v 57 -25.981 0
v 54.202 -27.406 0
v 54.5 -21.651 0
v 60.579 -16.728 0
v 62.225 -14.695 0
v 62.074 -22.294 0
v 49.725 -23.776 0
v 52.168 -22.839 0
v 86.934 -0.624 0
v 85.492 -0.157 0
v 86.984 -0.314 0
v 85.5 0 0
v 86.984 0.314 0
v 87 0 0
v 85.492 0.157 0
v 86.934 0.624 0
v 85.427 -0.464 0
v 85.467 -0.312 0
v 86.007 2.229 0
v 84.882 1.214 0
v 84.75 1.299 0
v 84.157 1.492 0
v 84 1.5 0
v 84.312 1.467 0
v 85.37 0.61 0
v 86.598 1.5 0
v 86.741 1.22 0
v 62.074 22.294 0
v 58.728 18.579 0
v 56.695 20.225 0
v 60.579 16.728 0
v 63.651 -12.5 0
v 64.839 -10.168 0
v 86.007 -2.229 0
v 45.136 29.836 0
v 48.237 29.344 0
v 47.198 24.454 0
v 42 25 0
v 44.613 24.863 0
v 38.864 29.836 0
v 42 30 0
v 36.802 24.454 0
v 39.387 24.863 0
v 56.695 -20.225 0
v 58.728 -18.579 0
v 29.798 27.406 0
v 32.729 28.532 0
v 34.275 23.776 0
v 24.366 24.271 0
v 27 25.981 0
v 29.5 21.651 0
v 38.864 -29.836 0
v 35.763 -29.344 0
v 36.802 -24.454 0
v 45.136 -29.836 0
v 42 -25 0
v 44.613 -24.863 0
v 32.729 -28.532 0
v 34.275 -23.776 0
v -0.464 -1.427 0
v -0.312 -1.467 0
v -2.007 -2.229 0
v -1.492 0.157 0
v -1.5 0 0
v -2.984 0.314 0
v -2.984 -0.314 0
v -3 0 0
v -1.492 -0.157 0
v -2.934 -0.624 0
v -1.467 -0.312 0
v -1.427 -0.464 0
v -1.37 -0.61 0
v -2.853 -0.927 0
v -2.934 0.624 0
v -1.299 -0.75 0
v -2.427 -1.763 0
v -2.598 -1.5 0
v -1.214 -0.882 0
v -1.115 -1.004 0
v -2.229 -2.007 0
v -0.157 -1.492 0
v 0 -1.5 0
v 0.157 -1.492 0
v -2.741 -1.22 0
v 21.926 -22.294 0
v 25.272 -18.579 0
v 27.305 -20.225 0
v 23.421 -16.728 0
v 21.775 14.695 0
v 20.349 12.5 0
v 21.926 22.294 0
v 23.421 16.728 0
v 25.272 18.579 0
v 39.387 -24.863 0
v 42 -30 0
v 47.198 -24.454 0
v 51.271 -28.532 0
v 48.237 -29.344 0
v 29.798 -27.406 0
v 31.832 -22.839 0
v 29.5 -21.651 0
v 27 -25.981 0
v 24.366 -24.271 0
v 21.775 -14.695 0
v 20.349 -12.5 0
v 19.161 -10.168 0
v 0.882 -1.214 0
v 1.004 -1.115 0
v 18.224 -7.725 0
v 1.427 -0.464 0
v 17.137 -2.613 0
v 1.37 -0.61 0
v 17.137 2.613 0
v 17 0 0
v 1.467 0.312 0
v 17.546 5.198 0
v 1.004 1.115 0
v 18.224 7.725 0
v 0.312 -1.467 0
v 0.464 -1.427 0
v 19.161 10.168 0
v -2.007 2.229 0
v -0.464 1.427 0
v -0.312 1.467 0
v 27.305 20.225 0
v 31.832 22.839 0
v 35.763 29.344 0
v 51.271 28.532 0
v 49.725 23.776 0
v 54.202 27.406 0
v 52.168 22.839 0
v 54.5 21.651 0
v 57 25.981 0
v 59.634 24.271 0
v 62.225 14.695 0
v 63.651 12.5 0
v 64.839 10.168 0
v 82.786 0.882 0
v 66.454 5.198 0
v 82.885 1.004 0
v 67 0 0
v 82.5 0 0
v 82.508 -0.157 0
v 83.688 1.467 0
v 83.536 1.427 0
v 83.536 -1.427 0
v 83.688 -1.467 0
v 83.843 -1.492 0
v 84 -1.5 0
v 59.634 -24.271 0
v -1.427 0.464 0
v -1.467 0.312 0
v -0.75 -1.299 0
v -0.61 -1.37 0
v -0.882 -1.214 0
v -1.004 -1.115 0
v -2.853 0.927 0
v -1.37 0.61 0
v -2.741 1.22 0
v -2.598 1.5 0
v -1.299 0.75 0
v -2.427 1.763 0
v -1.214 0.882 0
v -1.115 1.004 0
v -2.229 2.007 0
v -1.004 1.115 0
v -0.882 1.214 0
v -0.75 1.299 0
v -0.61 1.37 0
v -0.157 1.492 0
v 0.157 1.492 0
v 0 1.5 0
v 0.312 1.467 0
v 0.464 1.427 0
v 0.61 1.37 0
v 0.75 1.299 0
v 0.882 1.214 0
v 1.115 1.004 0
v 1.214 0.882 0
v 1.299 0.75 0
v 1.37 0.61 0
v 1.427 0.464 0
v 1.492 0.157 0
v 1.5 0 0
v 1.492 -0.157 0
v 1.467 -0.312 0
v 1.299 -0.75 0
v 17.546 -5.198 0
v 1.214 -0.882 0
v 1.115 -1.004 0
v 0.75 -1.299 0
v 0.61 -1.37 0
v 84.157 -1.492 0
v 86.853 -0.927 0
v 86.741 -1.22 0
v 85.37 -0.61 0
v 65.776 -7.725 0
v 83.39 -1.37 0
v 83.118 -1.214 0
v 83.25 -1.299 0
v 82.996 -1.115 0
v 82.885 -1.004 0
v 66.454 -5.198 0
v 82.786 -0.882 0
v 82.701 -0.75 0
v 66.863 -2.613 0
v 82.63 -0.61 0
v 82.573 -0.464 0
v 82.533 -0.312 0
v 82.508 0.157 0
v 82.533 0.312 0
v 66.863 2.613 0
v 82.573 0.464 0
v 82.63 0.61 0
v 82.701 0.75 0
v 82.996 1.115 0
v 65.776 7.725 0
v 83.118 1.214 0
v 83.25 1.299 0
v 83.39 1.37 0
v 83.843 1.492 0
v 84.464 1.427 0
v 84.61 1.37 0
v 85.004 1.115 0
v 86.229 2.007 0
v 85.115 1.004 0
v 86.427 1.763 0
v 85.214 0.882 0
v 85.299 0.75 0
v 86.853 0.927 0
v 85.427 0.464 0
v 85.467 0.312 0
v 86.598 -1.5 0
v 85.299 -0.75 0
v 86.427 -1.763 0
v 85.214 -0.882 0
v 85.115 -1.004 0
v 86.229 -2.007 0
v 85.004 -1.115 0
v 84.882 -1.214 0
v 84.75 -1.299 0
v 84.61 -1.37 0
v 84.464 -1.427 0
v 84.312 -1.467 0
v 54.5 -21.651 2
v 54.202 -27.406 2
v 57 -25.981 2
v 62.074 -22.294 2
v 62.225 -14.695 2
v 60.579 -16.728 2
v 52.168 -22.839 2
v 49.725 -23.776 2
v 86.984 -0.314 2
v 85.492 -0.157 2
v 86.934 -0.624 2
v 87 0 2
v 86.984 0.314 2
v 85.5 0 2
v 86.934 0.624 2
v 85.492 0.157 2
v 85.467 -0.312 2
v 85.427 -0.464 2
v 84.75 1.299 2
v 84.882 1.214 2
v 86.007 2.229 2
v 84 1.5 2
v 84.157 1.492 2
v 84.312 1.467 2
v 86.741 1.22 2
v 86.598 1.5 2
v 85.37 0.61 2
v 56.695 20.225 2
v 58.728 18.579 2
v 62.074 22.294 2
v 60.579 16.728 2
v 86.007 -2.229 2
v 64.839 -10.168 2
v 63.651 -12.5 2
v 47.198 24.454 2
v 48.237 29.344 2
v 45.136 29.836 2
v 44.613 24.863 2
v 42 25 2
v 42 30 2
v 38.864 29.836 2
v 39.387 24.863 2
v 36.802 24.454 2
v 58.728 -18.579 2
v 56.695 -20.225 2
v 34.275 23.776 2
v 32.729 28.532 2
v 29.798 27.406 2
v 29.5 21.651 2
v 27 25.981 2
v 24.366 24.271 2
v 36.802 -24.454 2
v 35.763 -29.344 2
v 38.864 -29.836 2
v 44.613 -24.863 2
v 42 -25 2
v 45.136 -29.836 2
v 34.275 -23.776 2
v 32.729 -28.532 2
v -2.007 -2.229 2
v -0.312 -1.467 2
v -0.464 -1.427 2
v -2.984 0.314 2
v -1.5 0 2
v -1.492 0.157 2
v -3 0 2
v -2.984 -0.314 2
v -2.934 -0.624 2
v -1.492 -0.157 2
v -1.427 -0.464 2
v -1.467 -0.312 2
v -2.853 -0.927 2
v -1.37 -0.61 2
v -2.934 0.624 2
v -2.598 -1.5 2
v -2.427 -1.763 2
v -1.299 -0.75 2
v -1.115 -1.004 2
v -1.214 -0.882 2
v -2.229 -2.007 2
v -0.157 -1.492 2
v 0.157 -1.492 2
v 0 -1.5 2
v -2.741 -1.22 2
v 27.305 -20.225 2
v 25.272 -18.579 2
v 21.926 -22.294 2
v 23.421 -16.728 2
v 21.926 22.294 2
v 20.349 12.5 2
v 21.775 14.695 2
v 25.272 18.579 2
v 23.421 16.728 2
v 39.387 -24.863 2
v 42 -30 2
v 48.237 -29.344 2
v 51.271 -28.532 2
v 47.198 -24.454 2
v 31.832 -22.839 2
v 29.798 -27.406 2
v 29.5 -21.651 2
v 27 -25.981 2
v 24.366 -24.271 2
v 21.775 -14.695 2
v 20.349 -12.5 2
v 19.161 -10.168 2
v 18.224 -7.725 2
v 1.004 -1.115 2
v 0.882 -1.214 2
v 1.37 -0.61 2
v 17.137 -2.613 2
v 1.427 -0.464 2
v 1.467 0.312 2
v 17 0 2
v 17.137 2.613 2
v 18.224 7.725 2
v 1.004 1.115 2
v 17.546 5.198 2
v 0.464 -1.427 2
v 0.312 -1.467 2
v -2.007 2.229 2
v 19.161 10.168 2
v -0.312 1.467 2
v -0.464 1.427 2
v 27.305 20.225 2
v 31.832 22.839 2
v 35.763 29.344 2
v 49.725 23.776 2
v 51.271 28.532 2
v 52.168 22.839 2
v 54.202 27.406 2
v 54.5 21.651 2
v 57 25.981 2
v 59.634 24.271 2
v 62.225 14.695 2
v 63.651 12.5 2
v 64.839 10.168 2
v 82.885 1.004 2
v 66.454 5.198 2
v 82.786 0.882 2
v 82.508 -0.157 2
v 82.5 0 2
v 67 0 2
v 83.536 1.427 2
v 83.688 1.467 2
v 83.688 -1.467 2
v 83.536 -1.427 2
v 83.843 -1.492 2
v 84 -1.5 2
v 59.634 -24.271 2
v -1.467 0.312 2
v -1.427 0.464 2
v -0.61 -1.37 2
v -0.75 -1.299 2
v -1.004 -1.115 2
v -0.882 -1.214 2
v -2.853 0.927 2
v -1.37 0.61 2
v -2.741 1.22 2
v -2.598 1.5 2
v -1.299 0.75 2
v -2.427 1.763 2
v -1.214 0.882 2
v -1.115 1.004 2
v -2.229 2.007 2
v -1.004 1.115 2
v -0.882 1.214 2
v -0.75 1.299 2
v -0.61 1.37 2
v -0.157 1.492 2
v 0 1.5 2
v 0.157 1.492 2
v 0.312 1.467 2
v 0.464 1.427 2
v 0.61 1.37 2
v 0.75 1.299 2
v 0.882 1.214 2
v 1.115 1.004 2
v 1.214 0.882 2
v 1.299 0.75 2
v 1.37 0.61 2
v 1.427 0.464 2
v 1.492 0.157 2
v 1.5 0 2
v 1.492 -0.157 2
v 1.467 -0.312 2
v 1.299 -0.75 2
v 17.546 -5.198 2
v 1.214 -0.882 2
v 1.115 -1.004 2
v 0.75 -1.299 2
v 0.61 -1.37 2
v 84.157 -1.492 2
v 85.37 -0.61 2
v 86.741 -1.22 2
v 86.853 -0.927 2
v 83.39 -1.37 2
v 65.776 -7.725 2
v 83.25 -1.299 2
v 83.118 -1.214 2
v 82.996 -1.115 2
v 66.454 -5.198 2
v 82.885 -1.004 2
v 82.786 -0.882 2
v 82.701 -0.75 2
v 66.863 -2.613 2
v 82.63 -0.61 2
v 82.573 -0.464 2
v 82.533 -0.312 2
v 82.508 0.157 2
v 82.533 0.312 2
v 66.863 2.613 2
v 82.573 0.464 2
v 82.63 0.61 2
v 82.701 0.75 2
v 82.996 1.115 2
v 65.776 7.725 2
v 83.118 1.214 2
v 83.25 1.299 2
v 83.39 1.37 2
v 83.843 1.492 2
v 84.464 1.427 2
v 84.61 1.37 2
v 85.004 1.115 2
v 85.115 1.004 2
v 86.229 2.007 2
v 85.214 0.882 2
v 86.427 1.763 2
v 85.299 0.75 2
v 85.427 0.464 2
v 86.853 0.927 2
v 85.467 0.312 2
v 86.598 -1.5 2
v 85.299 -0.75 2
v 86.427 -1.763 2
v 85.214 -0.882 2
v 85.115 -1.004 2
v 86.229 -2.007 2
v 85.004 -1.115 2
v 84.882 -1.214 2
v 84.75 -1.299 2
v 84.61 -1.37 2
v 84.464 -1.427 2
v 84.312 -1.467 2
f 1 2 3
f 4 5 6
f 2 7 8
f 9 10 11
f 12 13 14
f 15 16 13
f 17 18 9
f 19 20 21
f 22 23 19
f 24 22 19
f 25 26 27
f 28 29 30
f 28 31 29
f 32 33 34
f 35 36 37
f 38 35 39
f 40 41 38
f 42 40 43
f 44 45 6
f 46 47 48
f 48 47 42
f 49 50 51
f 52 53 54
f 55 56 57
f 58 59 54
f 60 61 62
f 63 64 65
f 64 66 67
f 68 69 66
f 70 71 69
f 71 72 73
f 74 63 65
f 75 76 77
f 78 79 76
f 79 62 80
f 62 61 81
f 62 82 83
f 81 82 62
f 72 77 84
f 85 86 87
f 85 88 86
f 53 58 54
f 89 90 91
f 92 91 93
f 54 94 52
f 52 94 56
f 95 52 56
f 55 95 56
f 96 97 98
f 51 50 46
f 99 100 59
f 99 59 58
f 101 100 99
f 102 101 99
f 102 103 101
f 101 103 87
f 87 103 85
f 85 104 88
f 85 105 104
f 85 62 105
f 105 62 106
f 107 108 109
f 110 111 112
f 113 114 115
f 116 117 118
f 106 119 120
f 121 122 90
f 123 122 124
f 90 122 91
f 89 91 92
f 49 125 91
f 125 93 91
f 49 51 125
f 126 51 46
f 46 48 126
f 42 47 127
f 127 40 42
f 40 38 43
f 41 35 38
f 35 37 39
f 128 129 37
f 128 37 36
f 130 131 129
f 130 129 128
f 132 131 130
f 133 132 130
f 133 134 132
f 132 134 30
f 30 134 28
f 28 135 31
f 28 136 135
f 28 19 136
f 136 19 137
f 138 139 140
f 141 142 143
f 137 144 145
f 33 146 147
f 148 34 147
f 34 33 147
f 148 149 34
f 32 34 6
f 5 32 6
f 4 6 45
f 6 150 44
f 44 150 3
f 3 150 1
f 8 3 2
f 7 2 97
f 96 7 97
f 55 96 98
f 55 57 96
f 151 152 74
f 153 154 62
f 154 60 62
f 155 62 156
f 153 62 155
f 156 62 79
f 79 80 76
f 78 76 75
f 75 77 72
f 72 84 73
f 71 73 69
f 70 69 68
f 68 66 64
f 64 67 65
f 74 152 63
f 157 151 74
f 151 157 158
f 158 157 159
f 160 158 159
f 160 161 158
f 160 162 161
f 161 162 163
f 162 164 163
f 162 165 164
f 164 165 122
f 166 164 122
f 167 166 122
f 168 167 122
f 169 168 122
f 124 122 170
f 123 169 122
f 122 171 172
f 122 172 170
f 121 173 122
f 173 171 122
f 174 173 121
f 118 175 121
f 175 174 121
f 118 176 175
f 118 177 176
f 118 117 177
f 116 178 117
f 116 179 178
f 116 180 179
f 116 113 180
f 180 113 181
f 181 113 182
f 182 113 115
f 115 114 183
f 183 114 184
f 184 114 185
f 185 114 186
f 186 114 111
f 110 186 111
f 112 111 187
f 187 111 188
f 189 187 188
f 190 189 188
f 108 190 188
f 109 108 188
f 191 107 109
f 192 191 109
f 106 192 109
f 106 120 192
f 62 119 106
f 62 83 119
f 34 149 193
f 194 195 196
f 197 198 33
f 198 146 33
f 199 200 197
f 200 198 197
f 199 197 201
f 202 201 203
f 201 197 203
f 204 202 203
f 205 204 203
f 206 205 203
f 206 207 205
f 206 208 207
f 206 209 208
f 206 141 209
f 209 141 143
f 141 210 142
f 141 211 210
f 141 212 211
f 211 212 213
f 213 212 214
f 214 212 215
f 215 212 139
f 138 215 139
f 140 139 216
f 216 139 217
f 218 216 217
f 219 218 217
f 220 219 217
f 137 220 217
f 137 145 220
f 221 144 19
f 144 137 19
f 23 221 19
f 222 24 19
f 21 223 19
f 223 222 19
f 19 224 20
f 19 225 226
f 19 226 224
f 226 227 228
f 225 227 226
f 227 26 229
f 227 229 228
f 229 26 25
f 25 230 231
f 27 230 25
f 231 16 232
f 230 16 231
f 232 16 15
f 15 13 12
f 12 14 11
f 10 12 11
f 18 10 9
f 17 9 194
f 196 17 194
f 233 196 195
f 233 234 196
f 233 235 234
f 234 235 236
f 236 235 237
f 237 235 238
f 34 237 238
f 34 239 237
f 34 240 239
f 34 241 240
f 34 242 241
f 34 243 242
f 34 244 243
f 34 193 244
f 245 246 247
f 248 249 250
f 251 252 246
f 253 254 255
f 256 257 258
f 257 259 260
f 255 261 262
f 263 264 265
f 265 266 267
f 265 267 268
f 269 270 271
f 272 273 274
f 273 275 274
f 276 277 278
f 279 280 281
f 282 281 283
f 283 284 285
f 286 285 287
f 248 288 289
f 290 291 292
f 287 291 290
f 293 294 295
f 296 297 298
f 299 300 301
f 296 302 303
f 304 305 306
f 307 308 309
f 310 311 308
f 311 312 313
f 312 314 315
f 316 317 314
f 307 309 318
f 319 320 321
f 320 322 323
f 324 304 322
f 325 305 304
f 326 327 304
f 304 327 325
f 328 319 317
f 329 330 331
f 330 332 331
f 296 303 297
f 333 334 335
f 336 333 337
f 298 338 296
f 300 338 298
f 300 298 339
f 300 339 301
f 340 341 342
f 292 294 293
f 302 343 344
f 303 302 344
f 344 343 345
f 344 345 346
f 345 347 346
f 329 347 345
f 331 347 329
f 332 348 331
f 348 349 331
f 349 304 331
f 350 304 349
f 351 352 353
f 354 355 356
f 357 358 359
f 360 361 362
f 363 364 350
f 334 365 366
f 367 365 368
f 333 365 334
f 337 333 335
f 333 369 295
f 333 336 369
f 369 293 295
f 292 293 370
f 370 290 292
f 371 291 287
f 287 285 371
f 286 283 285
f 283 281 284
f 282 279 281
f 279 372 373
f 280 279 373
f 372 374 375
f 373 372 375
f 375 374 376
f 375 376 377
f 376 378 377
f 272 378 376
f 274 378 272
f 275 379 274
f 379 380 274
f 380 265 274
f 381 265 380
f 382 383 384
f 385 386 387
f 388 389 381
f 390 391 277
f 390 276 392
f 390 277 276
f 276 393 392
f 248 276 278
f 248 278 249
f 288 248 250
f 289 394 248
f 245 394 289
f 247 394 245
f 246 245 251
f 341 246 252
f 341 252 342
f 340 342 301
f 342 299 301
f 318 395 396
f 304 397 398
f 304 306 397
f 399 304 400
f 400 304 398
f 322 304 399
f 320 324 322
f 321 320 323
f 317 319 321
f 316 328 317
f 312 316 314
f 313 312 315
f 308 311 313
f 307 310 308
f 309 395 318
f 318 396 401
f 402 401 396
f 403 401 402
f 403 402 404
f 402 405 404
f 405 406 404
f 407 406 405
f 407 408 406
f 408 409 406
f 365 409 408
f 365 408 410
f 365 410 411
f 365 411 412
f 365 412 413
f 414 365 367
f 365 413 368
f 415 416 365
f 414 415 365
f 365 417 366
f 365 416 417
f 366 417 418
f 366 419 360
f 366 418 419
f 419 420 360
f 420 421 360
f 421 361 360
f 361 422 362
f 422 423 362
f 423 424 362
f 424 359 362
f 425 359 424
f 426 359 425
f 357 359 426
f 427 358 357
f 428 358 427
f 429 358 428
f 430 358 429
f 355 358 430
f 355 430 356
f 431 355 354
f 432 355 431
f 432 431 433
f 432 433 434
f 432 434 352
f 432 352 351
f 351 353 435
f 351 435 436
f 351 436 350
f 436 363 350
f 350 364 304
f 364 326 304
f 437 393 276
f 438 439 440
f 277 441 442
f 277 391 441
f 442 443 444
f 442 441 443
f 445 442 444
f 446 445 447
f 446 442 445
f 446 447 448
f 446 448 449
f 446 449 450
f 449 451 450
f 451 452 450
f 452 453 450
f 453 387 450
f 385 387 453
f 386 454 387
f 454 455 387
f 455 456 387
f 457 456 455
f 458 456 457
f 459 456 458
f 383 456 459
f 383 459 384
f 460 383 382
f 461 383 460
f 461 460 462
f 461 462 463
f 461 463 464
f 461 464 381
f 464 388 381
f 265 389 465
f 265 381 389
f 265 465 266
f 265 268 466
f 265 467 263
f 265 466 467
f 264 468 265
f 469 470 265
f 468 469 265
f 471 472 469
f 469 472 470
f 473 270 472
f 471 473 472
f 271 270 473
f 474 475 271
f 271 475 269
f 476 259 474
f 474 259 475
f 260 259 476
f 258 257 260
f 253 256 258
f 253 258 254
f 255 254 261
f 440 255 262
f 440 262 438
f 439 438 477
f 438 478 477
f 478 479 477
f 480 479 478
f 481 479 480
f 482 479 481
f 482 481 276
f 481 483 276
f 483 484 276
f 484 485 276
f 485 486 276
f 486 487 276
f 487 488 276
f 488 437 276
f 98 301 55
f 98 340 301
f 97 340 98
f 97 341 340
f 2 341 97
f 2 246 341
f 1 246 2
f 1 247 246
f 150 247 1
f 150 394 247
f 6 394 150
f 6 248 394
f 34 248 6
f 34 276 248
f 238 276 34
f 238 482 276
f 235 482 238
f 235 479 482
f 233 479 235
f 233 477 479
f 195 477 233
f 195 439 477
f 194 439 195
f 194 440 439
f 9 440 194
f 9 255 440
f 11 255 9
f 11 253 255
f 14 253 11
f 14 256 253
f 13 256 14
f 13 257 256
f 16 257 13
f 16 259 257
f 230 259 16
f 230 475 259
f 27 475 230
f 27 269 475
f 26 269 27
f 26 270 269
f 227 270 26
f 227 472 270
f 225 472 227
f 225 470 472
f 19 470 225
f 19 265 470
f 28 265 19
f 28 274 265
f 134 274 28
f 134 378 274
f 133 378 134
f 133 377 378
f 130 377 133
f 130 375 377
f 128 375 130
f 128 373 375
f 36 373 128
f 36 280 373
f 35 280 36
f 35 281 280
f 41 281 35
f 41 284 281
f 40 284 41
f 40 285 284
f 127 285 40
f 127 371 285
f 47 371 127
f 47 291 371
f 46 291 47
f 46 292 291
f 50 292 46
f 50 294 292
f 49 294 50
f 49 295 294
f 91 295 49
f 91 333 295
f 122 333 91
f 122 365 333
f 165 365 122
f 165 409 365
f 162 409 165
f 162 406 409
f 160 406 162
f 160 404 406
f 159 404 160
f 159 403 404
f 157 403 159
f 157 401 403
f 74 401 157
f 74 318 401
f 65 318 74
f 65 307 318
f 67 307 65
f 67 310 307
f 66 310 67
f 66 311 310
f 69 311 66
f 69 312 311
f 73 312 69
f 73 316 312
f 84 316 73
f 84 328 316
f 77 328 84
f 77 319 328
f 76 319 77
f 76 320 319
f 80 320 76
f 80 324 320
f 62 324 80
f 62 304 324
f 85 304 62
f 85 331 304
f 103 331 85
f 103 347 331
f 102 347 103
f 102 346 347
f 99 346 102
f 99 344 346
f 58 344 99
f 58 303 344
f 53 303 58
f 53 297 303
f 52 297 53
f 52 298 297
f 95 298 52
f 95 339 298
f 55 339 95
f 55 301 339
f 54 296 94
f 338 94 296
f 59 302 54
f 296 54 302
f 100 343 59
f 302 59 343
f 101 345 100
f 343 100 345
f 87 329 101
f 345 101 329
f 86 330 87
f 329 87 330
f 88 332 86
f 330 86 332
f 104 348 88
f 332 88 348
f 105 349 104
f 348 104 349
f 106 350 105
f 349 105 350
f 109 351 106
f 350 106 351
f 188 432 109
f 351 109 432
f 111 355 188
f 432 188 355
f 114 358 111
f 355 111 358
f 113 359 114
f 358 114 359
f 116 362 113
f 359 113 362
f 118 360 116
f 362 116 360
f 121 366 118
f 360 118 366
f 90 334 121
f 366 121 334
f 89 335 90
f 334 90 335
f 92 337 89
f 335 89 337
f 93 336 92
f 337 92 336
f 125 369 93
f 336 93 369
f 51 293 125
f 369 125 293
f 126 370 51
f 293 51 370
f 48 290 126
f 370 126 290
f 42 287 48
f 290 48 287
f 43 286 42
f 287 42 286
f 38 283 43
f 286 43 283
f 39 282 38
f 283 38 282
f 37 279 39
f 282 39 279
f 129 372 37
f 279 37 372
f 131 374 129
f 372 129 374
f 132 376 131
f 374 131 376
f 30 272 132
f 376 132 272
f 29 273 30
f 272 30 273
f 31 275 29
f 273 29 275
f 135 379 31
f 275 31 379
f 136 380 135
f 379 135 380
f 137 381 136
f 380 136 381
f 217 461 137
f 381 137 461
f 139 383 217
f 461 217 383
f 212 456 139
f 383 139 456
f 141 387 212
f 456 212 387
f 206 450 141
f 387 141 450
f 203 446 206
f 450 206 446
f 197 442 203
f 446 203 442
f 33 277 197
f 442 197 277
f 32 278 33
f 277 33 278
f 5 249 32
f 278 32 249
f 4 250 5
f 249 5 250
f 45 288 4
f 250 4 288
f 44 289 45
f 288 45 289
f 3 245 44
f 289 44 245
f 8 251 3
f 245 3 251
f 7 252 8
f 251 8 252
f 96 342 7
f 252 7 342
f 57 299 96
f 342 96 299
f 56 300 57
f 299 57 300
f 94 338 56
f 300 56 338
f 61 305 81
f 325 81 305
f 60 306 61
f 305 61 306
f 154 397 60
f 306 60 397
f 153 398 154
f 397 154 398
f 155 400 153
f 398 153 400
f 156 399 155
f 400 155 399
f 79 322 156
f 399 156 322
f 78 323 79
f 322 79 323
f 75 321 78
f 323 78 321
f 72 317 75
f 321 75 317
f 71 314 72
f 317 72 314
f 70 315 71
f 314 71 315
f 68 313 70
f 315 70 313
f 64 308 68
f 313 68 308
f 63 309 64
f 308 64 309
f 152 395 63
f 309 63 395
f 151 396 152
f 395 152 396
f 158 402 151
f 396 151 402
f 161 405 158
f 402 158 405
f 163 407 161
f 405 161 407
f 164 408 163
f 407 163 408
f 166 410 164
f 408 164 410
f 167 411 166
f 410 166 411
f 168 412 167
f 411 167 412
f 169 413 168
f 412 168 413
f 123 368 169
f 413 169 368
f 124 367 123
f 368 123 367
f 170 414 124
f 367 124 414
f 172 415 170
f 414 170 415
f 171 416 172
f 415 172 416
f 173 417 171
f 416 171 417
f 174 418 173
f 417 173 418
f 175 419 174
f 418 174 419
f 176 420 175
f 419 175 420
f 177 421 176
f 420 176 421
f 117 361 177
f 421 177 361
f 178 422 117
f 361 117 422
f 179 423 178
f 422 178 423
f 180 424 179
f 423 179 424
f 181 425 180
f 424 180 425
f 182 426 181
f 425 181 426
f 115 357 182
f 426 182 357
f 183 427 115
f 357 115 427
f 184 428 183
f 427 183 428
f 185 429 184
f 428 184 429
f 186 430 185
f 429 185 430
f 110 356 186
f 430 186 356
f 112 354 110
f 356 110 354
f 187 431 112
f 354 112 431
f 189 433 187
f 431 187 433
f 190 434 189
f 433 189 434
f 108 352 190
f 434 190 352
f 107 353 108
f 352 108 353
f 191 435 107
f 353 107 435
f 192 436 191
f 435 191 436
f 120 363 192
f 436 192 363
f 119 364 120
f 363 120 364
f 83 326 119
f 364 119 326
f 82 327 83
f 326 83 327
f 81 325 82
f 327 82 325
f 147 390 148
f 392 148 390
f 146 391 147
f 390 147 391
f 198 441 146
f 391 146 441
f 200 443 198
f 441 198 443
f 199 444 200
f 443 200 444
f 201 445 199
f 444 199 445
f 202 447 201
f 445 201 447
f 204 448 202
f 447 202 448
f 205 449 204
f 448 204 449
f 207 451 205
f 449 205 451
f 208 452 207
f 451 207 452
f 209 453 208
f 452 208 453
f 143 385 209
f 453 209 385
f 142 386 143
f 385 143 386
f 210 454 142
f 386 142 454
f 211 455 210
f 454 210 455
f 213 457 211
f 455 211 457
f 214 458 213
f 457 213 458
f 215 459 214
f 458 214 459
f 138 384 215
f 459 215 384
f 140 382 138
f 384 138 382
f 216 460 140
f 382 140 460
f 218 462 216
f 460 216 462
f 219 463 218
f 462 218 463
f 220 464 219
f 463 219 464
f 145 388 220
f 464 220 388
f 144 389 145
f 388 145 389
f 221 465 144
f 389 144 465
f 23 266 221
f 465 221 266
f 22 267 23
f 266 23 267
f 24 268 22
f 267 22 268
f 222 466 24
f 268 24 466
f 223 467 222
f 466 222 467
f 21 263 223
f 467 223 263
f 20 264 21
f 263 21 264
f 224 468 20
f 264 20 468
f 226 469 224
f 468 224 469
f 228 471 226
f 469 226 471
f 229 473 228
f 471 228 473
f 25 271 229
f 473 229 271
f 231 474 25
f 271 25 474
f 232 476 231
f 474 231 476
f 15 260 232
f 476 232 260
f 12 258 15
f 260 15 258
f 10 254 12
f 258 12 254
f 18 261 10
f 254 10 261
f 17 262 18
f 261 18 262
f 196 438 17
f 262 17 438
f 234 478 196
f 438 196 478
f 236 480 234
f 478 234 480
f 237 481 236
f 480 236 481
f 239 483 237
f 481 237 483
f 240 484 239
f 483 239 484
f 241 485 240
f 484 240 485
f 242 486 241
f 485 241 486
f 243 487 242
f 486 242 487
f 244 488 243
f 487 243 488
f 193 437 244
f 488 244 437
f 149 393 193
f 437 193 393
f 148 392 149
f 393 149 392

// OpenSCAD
/*

 Low profile parametric wall plate

*/

screw_hole_x = 84;

screw_outer_diameter = 6;

screw_inner_diameter = 3;

opening_outer_diameter = 60;

opening_inner_diameter = 50;

inner_plate_thickness = 2;

quality = 60;

$fn = quality;

draw_inner_plate();

module draw_inner_plate() {
    linear_extrude(inner_plate_thickness)
        difference() {
            inner_plate_outline();
            circle(d = screw_inner_diameter);
            translate([screw_hole_x,0,0])
                circle(d = screw_inner_diameter);
            translate([screw_hole_x/2,0,0])
                circle(d = opening_inner_diameter);
        }
}

module inner_plate_outline() {
    hull() {
        circle(d = screw_outer_diameter);
        translate([screw_hole_x,0,0])
            circle(d = screw_outer_diameter);
        translate([screw_hole_x/2,0,0])
            circle(d = opening_outer_diameter);
    }    
}
